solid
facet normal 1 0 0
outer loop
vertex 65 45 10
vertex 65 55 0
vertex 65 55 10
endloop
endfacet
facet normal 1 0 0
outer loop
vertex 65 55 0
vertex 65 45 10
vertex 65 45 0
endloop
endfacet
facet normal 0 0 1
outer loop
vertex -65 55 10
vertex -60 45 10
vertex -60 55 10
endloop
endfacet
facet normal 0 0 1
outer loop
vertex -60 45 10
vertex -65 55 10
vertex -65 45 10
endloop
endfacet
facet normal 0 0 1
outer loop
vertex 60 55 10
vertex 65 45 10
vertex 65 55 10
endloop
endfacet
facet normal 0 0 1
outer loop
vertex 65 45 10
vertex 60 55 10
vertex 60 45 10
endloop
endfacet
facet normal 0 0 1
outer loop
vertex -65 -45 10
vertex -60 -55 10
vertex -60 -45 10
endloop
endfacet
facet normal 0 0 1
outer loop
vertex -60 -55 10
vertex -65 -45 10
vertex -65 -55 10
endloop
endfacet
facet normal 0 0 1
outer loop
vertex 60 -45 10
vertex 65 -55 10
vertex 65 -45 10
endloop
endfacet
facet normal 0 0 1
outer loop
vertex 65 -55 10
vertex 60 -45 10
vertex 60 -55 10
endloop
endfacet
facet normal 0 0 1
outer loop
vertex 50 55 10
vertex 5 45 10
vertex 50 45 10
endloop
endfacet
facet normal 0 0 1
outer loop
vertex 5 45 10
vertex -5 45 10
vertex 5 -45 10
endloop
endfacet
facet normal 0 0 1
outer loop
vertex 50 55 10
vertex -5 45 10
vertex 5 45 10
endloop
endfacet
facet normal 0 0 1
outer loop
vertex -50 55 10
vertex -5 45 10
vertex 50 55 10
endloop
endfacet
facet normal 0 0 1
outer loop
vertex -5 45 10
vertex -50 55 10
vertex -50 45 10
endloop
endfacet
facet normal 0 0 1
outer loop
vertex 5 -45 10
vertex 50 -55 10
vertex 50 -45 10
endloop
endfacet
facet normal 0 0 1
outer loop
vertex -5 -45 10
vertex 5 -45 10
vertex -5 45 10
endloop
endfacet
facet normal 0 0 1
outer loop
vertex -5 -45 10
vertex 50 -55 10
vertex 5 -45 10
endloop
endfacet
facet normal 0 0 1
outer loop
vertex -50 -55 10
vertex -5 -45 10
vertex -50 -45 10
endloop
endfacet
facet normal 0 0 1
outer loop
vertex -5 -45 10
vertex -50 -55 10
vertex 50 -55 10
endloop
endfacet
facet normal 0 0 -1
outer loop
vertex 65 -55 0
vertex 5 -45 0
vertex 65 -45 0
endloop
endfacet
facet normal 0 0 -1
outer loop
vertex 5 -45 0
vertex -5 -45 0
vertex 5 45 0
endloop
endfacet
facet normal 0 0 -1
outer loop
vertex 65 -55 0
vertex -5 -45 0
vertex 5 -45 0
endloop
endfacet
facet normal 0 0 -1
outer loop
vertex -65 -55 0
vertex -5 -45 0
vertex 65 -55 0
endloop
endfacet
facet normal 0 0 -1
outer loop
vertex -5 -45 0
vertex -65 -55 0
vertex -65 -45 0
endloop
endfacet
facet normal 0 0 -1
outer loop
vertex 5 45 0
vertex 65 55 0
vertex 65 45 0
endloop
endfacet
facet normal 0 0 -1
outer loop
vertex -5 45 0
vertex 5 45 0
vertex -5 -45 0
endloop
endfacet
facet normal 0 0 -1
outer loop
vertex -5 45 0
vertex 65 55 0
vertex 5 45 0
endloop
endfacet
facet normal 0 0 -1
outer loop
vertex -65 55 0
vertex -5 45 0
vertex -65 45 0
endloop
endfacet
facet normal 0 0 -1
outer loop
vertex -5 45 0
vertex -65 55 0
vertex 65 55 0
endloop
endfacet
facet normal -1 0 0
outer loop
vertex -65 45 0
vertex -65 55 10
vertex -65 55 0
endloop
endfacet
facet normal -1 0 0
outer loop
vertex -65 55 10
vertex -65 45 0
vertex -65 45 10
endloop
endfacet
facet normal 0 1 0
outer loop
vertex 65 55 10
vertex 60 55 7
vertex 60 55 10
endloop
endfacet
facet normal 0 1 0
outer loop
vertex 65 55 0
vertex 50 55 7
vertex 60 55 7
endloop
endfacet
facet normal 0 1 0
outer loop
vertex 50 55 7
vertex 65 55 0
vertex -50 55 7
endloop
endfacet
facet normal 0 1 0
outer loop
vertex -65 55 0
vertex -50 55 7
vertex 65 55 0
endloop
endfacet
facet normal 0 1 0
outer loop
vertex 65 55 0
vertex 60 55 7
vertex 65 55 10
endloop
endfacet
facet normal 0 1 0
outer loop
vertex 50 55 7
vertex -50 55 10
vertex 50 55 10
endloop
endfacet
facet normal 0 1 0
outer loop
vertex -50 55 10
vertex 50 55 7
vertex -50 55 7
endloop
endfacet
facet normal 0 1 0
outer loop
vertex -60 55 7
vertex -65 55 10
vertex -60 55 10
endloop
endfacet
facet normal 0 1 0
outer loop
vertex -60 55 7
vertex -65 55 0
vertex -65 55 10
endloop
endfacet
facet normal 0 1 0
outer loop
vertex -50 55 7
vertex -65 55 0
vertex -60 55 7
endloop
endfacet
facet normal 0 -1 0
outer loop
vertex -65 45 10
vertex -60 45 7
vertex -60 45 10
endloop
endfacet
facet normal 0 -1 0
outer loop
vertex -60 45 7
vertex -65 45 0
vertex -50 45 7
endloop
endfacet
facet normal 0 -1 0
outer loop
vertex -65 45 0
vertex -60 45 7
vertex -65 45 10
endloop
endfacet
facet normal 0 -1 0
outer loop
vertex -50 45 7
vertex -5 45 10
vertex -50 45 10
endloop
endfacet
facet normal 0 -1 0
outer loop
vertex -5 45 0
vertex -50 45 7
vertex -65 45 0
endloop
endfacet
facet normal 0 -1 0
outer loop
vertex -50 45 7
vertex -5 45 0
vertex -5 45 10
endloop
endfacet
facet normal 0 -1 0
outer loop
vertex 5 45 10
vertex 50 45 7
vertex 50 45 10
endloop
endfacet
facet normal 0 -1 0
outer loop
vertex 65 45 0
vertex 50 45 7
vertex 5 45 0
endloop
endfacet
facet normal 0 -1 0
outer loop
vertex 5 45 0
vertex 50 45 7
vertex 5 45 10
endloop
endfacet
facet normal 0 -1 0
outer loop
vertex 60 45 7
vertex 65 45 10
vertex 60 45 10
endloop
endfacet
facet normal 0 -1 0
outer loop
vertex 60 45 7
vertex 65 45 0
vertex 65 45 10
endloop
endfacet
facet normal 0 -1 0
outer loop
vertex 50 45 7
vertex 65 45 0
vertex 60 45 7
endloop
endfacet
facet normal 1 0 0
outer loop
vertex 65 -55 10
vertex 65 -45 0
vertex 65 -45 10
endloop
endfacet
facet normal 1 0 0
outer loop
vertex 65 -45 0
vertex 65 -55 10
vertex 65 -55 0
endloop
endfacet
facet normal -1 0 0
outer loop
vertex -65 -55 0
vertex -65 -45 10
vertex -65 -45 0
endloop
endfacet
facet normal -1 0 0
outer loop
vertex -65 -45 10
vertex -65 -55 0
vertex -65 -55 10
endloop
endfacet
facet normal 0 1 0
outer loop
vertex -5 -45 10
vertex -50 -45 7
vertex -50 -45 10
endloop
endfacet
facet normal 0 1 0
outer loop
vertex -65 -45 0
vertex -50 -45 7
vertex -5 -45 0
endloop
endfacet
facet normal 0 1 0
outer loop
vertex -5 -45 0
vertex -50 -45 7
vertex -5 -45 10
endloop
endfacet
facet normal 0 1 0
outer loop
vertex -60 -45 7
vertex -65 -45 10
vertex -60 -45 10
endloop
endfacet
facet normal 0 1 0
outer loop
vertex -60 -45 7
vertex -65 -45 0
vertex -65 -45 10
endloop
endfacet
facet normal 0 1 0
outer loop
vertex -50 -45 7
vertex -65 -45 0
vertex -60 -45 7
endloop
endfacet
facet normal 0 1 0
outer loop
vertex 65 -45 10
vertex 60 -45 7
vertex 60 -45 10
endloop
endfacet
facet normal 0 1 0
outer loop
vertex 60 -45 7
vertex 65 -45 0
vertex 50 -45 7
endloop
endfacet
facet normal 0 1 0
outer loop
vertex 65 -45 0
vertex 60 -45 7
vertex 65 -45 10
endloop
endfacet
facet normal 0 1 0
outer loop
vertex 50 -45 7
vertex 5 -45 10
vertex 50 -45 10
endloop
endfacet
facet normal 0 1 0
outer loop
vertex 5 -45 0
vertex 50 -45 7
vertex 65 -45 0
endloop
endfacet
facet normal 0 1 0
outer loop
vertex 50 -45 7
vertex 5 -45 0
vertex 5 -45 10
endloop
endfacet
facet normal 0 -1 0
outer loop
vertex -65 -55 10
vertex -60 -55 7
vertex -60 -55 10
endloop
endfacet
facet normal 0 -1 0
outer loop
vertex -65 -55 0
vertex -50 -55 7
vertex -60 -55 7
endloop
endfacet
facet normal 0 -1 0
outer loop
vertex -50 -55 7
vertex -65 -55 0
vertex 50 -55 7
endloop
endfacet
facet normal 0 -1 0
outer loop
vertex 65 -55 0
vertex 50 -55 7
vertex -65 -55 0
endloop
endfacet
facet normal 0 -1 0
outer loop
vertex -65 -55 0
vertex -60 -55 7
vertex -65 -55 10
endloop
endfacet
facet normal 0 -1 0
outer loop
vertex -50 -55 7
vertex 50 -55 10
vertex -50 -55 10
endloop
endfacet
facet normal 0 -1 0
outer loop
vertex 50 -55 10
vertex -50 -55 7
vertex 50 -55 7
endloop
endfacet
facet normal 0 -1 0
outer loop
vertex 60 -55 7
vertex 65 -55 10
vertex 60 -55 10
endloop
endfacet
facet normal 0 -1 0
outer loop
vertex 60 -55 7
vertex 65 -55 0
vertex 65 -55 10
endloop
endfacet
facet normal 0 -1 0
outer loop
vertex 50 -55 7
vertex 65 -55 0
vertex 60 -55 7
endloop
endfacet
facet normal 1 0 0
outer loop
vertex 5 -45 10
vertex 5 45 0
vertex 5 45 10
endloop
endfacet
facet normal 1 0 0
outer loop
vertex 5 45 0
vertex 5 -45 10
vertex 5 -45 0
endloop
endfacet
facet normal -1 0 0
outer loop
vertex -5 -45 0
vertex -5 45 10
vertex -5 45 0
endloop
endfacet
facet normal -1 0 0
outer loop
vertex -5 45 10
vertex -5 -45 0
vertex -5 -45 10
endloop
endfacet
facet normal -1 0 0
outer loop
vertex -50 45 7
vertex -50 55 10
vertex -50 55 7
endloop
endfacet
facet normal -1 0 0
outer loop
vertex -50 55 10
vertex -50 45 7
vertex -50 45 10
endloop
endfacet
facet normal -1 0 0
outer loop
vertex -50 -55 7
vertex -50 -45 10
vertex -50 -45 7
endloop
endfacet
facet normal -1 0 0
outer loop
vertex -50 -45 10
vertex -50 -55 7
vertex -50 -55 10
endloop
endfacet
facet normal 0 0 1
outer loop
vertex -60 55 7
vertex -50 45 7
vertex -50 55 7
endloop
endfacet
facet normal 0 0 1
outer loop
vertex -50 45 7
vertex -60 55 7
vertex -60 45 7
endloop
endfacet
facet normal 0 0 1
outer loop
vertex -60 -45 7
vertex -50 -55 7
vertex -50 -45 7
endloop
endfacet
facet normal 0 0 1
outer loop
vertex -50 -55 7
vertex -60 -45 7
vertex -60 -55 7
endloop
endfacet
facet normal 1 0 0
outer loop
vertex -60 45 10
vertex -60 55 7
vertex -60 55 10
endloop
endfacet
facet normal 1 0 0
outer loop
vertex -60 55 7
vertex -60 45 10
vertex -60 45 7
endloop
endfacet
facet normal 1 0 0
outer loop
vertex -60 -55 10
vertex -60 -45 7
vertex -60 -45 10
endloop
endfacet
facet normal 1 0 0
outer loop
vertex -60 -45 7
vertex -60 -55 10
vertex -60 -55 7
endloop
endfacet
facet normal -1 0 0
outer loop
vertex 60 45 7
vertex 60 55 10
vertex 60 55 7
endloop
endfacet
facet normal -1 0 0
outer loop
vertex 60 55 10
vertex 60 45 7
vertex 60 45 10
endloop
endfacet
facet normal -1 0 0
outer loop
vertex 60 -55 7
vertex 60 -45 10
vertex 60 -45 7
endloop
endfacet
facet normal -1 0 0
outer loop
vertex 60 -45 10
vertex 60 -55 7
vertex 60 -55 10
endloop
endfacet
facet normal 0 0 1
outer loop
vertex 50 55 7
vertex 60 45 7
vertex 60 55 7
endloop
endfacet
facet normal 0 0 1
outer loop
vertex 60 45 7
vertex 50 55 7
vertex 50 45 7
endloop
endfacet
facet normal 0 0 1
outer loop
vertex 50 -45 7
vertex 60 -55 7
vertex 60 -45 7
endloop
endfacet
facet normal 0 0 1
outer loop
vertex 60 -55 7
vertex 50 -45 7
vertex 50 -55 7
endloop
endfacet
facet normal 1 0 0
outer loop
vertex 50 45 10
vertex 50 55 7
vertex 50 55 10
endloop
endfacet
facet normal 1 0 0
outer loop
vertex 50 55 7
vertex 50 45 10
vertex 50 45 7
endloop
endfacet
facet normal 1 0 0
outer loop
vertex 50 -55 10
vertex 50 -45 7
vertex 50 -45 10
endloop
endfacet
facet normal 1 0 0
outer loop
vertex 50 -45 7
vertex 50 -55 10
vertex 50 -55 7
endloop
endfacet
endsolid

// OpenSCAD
/*
  Sodastream-Easy Verdunstungshilfe
  
  Verhindert Wasseransammlungen unter dem Plastikgehäuse

*/
$fn = $preview ? 20 : 100;


breite = 55;
stegbreite = 10;
steghoehe = 10;
nuttiefe = 3;

difference() {
    union() {
        translate([-breite-stegbreite,45,0])
        cube([breite*2+20,stegbreite,steghoehe]);

        translate([-breite-stegbreite,-45-10,0])
        cube([breite*2+20,stegbreite,steghoehe]);

        translate([-stegbreite/2,-45-5,00])
        cube([stegbreite,100,steghoehe]);
    }
    
    union() {
        translate([-breite-stegbreite/2,-45-15,steghoehe-nuttiefe])
        cube([stegbreite,120,steghoehe]);

        translate([breite-stegbreite/2,-45-15,steghoehe-nuttiefe])
        cube([stegbreite,120,steghoehe]);
    }
}
